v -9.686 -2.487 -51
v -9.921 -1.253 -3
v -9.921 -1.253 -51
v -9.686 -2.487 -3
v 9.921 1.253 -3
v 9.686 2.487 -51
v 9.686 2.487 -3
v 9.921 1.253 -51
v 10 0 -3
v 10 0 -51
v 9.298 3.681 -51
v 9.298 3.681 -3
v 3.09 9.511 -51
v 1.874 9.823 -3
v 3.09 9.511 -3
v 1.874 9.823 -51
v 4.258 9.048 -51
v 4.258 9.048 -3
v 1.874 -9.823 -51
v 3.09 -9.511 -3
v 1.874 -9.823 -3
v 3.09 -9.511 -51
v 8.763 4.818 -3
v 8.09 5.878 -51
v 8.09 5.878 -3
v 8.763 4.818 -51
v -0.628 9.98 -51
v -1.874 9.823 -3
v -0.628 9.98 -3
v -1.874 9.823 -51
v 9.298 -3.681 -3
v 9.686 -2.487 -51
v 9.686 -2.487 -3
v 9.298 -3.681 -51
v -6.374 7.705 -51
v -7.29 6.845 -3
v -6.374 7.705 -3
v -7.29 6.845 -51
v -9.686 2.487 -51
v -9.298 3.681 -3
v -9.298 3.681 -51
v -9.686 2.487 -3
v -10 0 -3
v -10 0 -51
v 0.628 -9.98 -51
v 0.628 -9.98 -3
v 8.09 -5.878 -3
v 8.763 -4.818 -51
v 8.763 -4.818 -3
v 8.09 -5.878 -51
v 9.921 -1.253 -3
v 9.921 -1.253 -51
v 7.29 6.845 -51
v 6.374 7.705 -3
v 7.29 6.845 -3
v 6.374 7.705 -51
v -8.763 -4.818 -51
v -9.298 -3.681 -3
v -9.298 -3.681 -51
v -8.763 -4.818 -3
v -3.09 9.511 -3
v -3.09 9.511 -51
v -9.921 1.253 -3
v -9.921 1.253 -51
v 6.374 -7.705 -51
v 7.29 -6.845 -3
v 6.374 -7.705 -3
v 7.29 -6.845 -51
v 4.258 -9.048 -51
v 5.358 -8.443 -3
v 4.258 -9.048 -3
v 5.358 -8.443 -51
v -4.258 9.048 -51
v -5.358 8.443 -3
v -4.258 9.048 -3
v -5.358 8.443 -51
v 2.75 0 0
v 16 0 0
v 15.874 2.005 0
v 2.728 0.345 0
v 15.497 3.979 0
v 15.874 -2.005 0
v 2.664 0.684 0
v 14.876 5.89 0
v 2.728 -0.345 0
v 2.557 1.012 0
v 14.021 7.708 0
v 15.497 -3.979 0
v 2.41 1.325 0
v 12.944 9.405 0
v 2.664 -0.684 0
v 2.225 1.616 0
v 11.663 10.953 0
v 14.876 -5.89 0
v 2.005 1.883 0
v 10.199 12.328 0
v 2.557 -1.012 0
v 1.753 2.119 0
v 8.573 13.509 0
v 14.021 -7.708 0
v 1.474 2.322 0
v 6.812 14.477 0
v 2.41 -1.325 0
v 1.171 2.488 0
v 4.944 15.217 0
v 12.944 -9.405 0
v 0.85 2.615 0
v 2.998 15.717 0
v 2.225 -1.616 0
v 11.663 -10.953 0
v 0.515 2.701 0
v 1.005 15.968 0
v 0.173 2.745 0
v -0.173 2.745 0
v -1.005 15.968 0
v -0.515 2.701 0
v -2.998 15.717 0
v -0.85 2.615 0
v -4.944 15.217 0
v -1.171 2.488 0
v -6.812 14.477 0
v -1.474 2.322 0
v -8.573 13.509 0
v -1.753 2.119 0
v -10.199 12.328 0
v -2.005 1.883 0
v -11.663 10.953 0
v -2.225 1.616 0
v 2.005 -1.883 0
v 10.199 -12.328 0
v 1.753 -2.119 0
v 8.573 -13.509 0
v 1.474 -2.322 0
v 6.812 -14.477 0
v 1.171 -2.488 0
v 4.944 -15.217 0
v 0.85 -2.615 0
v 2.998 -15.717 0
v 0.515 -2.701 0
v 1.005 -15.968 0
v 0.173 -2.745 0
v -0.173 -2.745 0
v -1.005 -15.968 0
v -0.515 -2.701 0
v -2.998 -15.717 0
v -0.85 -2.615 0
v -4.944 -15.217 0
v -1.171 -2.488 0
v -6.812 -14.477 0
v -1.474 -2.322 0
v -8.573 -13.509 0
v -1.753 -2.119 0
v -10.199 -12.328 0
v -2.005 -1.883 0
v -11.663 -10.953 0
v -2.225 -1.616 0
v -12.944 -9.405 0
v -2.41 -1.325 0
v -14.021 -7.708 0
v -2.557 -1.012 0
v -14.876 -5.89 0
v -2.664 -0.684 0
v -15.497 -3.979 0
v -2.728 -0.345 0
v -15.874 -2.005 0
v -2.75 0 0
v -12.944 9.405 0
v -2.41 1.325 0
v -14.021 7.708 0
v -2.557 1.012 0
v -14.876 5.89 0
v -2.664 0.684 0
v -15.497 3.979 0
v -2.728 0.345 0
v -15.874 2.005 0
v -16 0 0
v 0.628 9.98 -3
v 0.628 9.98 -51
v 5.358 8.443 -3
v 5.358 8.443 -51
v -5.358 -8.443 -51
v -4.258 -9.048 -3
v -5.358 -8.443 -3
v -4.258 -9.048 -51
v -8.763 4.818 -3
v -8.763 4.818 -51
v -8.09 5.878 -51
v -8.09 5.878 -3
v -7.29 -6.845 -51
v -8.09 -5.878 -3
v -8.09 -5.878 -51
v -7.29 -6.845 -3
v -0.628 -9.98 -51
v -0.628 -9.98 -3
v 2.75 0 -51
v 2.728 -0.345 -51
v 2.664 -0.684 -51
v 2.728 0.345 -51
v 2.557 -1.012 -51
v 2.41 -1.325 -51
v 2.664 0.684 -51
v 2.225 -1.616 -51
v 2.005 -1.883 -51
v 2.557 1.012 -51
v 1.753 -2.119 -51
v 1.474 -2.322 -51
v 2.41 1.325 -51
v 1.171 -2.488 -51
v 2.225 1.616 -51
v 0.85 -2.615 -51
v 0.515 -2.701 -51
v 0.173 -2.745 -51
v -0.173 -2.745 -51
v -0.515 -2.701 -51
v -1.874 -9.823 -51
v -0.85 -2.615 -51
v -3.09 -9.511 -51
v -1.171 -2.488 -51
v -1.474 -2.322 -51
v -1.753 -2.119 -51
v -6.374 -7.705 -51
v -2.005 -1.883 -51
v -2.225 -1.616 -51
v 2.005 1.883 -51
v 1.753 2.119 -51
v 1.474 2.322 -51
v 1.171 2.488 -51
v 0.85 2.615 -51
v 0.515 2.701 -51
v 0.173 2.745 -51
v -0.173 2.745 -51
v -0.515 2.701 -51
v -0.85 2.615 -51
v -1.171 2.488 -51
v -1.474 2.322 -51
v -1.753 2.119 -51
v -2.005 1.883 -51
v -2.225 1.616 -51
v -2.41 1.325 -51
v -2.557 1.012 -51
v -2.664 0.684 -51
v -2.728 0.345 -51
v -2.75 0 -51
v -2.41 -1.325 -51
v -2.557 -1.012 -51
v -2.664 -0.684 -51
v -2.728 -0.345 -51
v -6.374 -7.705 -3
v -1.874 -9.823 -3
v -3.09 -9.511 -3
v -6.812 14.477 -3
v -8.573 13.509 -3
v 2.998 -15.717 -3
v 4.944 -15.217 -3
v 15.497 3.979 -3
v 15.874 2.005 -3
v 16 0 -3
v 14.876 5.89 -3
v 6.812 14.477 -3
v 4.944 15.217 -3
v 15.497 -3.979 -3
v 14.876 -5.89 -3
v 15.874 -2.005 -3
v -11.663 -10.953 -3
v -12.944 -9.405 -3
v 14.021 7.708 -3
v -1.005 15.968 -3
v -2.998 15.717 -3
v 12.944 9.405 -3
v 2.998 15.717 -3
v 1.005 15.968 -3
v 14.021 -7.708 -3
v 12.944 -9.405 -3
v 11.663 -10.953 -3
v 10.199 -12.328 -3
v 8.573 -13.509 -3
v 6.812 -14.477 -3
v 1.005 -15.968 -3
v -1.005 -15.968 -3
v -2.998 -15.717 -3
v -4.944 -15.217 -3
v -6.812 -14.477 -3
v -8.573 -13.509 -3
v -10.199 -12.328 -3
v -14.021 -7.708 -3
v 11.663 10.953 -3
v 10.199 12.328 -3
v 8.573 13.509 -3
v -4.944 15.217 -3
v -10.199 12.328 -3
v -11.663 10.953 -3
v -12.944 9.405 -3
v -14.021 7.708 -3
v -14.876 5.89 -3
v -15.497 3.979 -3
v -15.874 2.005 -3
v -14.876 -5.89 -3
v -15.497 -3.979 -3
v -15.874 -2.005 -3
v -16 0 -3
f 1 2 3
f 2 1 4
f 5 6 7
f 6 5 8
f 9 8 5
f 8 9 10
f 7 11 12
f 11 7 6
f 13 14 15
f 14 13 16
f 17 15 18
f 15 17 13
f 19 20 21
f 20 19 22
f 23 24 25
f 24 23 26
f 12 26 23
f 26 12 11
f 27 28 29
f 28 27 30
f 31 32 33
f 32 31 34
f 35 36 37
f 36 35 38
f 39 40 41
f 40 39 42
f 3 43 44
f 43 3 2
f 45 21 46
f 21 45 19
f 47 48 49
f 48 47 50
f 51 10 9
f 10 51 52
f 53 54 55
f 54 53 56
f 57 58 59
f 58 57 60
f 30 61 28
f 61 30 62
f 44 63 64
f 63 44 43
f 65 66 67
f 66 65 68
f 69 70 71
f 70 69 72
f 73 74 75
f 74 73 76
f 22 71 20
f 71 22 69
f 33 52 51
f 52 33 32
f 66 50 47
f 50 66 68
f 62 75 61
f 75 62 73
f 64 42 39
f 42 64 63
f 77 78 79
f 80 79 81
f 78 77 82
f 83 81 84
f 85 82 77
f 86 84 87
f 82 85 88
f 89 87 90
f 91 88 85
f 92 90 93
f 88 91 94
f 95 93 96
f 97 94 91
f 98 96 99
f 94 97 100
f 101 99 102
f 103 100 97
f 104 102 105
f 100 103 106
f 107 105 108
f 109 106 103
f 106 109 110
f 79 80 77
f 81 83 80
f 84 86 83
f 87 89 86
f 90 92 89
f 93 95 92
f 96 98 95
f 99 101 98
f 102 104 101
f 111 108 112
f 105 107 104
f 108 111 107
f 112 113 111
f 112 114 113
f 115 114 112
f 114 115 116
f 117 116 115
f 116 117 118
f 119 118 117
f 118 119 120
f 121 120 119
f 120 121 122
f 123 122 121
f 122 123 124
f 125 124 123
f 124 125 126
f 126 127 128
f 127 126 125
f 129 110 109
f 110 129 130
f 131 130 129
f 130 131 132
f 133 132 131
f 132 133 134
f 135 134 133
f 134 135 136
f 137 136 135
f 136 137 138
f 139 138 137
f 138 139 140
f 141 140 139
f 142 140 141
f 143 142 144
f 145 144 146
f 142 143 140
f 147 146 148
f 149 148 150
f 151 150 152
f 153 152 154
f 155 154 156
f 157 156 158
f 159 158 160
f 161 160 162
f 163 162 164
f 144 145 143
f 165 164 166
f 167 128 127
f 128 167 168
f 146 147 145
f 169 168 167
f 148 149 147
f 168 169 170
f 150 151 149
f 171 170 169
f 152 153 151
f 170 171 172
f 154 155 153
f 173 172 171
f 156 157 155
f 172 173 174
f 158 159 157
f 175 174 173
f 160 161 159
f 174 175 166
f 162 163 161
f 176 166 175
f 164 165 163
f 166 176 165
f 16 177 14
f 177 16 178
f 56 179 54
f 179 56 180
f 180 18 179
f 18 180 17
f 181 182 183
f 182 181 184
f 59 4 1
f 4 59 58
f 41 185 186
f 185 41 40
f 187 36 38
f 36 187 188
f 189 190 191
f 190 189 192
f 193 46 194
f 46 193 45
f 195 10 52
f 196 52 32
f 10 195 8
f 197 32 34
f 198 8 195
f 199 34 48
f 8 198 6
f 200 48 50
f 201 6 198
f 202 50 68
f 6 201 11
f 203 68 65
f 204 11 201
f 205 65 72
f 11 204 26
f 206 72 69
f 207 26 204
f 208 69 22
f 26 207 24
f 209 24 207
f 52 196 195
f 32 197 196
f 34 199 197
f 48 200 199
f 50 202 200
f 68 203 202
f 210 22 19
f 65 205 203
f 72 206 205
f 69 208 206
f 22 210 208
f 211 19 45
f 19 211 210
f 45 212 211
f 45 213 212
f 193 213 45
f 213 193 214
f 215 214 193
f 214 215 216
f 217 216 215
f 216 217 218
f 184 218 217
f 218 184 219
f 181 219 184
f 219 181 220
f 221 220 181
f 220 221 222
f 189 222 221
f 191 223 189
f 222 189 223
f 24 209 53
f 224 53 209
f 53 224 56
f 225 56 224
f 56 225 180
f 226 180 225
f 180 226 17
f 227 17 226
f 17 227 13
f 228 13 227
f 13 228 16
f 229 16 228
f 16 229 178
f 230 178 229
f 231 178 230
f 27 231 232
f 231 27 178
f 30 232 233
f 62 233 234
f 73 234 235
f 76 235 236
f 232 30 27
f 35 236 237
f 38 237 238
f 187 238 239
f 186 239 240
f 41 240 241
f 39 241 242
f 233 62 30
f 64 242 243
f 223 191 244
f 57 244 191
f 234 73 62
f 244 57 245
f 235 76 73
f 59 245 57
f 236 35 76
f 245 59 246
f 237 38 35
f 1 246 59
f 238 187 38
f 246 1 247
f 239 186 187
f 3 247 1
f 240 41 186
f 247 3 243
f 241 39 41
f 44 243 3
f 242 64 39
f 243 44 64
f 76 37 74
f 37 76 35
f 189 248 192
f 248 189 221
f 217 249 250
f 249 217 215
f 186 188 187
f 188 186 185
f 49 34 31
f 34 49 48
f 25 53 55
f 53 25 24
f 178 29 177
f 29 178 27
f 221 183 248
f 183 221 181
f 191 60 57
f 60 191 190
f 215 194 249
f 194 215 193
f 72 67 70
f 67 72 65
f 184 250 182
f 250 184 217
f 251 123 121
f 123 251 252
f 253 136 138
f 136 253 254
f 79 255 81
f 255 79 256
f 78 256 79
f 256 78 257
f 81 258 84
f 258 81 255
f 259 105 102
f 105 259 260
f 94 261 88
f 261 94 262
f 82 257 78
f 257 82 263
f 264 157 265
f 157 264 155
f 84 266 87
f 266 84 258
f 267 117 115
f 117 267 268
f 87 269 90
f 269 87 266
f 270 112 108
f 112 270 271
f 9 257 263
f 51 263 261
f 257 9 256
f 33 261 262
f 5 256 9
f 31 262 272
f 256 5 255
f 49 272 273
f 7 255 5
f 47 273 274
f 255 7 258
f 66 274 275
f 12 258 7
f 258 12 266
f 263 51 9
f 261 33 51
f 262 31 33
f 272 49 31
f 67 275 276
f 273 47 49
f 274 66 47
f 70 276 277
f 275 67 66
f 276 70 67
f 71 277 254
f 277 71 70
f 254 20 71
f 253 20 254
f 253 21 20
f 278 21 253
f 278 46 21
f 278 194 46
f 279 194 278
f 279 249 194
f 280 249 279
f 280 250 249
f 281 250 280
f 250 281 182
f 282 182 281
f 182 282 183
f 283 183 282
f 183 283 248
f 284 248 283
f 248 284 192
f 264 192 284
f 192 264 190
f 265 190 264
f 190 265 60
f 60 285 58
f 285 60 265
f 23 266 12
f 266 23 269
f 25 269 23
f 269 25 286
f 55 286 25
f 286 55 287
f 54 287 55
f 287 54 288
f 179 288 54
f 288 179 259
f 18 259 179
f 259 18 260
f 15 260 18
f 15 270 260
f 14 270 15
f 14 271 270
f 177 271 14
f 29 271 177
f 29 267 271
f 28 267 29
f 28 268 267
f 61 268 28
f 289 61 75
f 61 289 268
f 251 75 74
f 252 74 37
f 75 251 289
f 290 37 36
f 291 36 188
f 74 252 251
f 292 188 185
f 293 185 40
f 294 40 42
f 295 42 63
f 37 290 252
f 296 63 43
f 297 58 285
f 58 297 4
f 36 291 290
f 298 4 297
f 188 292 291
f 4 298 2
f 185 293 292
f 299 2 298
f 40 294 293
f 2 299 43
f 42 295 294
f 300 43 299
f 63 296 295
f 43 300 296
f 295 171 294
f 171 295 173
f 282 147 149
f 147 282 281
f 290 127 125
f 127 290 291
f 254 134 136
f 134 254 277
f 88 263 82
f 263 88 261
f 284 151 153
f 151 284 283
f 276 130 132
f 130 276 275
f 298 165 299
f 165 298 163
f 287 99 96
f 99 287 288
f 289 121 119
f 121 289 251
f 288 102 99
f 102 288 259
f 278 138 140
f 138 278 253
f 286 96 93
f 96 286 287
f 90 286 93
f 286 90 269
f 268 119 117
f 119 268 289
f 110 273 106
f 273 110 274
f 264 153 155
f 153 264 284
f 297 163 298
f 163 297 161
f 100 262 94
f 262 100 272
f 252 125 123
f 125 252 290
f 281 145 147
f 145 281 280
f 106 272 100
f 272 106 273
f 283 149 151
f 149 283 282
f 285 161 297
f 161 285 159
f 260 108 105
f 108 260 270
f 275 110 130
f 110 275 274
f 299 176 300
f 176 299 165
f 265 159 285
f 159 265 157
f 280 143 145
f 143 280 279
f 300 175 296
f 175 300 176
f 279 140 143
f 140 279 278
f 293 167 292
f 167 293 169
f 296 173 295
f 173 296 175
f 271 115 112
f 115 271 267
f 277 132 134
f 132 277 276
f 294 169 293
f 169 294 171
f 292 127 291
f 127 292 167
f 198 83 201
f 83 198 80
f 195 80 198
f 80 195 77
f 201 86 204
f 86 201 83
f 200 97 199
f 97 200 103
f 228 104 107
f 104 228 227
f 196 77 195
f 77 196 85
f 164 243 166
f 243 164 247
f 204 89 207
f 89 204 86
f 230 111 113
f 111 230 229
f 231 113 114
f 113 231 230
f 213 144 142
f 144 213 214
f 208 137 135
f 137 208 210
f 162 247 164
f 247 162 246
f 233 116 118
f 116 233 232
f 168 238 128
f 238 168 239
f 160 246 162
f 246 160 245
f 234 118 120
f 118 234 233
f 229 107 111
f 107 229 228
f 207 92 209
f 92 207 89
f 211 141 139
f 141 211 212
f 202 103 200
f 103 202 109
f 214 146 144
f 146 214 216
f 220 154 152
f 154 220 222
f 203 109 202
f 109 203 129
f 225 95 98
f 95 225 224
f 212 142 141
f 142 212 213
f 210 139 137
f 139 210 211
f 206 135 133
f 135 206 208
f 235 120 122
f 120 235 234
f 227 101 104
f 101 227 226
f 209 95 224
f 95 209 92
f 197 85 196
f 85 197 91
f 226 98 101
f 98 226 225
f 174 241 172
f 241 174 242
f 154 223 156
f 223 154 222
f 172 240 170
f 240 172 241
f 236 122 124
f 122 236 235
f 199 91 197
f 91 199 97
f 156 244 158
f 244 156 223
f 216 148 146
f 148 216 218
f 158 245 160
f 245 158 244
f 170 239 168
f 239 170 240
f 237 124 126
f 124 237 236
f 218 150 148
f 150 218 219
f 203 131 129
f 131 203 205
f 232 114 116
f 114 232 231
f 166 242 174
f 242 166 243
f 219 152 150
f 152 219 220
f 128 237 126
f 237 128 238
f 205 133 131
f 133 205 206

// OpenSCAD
$fn = 50;


difference() {
	union() {
		translate(v = [0, 0, -51.0000000000]) {
			cylinder(h = 51, r = 10.0000000000);
		}
		translate(v = [0, 0, -3.0000000000]) {
			cylinder(h = 3, r = 16.0000000000);
		}
	}
	union() {
		#translate(v = [0, 0, -51]) {
			cylinder(h = 51, r = 2.7500000000);
		}
	}
}
